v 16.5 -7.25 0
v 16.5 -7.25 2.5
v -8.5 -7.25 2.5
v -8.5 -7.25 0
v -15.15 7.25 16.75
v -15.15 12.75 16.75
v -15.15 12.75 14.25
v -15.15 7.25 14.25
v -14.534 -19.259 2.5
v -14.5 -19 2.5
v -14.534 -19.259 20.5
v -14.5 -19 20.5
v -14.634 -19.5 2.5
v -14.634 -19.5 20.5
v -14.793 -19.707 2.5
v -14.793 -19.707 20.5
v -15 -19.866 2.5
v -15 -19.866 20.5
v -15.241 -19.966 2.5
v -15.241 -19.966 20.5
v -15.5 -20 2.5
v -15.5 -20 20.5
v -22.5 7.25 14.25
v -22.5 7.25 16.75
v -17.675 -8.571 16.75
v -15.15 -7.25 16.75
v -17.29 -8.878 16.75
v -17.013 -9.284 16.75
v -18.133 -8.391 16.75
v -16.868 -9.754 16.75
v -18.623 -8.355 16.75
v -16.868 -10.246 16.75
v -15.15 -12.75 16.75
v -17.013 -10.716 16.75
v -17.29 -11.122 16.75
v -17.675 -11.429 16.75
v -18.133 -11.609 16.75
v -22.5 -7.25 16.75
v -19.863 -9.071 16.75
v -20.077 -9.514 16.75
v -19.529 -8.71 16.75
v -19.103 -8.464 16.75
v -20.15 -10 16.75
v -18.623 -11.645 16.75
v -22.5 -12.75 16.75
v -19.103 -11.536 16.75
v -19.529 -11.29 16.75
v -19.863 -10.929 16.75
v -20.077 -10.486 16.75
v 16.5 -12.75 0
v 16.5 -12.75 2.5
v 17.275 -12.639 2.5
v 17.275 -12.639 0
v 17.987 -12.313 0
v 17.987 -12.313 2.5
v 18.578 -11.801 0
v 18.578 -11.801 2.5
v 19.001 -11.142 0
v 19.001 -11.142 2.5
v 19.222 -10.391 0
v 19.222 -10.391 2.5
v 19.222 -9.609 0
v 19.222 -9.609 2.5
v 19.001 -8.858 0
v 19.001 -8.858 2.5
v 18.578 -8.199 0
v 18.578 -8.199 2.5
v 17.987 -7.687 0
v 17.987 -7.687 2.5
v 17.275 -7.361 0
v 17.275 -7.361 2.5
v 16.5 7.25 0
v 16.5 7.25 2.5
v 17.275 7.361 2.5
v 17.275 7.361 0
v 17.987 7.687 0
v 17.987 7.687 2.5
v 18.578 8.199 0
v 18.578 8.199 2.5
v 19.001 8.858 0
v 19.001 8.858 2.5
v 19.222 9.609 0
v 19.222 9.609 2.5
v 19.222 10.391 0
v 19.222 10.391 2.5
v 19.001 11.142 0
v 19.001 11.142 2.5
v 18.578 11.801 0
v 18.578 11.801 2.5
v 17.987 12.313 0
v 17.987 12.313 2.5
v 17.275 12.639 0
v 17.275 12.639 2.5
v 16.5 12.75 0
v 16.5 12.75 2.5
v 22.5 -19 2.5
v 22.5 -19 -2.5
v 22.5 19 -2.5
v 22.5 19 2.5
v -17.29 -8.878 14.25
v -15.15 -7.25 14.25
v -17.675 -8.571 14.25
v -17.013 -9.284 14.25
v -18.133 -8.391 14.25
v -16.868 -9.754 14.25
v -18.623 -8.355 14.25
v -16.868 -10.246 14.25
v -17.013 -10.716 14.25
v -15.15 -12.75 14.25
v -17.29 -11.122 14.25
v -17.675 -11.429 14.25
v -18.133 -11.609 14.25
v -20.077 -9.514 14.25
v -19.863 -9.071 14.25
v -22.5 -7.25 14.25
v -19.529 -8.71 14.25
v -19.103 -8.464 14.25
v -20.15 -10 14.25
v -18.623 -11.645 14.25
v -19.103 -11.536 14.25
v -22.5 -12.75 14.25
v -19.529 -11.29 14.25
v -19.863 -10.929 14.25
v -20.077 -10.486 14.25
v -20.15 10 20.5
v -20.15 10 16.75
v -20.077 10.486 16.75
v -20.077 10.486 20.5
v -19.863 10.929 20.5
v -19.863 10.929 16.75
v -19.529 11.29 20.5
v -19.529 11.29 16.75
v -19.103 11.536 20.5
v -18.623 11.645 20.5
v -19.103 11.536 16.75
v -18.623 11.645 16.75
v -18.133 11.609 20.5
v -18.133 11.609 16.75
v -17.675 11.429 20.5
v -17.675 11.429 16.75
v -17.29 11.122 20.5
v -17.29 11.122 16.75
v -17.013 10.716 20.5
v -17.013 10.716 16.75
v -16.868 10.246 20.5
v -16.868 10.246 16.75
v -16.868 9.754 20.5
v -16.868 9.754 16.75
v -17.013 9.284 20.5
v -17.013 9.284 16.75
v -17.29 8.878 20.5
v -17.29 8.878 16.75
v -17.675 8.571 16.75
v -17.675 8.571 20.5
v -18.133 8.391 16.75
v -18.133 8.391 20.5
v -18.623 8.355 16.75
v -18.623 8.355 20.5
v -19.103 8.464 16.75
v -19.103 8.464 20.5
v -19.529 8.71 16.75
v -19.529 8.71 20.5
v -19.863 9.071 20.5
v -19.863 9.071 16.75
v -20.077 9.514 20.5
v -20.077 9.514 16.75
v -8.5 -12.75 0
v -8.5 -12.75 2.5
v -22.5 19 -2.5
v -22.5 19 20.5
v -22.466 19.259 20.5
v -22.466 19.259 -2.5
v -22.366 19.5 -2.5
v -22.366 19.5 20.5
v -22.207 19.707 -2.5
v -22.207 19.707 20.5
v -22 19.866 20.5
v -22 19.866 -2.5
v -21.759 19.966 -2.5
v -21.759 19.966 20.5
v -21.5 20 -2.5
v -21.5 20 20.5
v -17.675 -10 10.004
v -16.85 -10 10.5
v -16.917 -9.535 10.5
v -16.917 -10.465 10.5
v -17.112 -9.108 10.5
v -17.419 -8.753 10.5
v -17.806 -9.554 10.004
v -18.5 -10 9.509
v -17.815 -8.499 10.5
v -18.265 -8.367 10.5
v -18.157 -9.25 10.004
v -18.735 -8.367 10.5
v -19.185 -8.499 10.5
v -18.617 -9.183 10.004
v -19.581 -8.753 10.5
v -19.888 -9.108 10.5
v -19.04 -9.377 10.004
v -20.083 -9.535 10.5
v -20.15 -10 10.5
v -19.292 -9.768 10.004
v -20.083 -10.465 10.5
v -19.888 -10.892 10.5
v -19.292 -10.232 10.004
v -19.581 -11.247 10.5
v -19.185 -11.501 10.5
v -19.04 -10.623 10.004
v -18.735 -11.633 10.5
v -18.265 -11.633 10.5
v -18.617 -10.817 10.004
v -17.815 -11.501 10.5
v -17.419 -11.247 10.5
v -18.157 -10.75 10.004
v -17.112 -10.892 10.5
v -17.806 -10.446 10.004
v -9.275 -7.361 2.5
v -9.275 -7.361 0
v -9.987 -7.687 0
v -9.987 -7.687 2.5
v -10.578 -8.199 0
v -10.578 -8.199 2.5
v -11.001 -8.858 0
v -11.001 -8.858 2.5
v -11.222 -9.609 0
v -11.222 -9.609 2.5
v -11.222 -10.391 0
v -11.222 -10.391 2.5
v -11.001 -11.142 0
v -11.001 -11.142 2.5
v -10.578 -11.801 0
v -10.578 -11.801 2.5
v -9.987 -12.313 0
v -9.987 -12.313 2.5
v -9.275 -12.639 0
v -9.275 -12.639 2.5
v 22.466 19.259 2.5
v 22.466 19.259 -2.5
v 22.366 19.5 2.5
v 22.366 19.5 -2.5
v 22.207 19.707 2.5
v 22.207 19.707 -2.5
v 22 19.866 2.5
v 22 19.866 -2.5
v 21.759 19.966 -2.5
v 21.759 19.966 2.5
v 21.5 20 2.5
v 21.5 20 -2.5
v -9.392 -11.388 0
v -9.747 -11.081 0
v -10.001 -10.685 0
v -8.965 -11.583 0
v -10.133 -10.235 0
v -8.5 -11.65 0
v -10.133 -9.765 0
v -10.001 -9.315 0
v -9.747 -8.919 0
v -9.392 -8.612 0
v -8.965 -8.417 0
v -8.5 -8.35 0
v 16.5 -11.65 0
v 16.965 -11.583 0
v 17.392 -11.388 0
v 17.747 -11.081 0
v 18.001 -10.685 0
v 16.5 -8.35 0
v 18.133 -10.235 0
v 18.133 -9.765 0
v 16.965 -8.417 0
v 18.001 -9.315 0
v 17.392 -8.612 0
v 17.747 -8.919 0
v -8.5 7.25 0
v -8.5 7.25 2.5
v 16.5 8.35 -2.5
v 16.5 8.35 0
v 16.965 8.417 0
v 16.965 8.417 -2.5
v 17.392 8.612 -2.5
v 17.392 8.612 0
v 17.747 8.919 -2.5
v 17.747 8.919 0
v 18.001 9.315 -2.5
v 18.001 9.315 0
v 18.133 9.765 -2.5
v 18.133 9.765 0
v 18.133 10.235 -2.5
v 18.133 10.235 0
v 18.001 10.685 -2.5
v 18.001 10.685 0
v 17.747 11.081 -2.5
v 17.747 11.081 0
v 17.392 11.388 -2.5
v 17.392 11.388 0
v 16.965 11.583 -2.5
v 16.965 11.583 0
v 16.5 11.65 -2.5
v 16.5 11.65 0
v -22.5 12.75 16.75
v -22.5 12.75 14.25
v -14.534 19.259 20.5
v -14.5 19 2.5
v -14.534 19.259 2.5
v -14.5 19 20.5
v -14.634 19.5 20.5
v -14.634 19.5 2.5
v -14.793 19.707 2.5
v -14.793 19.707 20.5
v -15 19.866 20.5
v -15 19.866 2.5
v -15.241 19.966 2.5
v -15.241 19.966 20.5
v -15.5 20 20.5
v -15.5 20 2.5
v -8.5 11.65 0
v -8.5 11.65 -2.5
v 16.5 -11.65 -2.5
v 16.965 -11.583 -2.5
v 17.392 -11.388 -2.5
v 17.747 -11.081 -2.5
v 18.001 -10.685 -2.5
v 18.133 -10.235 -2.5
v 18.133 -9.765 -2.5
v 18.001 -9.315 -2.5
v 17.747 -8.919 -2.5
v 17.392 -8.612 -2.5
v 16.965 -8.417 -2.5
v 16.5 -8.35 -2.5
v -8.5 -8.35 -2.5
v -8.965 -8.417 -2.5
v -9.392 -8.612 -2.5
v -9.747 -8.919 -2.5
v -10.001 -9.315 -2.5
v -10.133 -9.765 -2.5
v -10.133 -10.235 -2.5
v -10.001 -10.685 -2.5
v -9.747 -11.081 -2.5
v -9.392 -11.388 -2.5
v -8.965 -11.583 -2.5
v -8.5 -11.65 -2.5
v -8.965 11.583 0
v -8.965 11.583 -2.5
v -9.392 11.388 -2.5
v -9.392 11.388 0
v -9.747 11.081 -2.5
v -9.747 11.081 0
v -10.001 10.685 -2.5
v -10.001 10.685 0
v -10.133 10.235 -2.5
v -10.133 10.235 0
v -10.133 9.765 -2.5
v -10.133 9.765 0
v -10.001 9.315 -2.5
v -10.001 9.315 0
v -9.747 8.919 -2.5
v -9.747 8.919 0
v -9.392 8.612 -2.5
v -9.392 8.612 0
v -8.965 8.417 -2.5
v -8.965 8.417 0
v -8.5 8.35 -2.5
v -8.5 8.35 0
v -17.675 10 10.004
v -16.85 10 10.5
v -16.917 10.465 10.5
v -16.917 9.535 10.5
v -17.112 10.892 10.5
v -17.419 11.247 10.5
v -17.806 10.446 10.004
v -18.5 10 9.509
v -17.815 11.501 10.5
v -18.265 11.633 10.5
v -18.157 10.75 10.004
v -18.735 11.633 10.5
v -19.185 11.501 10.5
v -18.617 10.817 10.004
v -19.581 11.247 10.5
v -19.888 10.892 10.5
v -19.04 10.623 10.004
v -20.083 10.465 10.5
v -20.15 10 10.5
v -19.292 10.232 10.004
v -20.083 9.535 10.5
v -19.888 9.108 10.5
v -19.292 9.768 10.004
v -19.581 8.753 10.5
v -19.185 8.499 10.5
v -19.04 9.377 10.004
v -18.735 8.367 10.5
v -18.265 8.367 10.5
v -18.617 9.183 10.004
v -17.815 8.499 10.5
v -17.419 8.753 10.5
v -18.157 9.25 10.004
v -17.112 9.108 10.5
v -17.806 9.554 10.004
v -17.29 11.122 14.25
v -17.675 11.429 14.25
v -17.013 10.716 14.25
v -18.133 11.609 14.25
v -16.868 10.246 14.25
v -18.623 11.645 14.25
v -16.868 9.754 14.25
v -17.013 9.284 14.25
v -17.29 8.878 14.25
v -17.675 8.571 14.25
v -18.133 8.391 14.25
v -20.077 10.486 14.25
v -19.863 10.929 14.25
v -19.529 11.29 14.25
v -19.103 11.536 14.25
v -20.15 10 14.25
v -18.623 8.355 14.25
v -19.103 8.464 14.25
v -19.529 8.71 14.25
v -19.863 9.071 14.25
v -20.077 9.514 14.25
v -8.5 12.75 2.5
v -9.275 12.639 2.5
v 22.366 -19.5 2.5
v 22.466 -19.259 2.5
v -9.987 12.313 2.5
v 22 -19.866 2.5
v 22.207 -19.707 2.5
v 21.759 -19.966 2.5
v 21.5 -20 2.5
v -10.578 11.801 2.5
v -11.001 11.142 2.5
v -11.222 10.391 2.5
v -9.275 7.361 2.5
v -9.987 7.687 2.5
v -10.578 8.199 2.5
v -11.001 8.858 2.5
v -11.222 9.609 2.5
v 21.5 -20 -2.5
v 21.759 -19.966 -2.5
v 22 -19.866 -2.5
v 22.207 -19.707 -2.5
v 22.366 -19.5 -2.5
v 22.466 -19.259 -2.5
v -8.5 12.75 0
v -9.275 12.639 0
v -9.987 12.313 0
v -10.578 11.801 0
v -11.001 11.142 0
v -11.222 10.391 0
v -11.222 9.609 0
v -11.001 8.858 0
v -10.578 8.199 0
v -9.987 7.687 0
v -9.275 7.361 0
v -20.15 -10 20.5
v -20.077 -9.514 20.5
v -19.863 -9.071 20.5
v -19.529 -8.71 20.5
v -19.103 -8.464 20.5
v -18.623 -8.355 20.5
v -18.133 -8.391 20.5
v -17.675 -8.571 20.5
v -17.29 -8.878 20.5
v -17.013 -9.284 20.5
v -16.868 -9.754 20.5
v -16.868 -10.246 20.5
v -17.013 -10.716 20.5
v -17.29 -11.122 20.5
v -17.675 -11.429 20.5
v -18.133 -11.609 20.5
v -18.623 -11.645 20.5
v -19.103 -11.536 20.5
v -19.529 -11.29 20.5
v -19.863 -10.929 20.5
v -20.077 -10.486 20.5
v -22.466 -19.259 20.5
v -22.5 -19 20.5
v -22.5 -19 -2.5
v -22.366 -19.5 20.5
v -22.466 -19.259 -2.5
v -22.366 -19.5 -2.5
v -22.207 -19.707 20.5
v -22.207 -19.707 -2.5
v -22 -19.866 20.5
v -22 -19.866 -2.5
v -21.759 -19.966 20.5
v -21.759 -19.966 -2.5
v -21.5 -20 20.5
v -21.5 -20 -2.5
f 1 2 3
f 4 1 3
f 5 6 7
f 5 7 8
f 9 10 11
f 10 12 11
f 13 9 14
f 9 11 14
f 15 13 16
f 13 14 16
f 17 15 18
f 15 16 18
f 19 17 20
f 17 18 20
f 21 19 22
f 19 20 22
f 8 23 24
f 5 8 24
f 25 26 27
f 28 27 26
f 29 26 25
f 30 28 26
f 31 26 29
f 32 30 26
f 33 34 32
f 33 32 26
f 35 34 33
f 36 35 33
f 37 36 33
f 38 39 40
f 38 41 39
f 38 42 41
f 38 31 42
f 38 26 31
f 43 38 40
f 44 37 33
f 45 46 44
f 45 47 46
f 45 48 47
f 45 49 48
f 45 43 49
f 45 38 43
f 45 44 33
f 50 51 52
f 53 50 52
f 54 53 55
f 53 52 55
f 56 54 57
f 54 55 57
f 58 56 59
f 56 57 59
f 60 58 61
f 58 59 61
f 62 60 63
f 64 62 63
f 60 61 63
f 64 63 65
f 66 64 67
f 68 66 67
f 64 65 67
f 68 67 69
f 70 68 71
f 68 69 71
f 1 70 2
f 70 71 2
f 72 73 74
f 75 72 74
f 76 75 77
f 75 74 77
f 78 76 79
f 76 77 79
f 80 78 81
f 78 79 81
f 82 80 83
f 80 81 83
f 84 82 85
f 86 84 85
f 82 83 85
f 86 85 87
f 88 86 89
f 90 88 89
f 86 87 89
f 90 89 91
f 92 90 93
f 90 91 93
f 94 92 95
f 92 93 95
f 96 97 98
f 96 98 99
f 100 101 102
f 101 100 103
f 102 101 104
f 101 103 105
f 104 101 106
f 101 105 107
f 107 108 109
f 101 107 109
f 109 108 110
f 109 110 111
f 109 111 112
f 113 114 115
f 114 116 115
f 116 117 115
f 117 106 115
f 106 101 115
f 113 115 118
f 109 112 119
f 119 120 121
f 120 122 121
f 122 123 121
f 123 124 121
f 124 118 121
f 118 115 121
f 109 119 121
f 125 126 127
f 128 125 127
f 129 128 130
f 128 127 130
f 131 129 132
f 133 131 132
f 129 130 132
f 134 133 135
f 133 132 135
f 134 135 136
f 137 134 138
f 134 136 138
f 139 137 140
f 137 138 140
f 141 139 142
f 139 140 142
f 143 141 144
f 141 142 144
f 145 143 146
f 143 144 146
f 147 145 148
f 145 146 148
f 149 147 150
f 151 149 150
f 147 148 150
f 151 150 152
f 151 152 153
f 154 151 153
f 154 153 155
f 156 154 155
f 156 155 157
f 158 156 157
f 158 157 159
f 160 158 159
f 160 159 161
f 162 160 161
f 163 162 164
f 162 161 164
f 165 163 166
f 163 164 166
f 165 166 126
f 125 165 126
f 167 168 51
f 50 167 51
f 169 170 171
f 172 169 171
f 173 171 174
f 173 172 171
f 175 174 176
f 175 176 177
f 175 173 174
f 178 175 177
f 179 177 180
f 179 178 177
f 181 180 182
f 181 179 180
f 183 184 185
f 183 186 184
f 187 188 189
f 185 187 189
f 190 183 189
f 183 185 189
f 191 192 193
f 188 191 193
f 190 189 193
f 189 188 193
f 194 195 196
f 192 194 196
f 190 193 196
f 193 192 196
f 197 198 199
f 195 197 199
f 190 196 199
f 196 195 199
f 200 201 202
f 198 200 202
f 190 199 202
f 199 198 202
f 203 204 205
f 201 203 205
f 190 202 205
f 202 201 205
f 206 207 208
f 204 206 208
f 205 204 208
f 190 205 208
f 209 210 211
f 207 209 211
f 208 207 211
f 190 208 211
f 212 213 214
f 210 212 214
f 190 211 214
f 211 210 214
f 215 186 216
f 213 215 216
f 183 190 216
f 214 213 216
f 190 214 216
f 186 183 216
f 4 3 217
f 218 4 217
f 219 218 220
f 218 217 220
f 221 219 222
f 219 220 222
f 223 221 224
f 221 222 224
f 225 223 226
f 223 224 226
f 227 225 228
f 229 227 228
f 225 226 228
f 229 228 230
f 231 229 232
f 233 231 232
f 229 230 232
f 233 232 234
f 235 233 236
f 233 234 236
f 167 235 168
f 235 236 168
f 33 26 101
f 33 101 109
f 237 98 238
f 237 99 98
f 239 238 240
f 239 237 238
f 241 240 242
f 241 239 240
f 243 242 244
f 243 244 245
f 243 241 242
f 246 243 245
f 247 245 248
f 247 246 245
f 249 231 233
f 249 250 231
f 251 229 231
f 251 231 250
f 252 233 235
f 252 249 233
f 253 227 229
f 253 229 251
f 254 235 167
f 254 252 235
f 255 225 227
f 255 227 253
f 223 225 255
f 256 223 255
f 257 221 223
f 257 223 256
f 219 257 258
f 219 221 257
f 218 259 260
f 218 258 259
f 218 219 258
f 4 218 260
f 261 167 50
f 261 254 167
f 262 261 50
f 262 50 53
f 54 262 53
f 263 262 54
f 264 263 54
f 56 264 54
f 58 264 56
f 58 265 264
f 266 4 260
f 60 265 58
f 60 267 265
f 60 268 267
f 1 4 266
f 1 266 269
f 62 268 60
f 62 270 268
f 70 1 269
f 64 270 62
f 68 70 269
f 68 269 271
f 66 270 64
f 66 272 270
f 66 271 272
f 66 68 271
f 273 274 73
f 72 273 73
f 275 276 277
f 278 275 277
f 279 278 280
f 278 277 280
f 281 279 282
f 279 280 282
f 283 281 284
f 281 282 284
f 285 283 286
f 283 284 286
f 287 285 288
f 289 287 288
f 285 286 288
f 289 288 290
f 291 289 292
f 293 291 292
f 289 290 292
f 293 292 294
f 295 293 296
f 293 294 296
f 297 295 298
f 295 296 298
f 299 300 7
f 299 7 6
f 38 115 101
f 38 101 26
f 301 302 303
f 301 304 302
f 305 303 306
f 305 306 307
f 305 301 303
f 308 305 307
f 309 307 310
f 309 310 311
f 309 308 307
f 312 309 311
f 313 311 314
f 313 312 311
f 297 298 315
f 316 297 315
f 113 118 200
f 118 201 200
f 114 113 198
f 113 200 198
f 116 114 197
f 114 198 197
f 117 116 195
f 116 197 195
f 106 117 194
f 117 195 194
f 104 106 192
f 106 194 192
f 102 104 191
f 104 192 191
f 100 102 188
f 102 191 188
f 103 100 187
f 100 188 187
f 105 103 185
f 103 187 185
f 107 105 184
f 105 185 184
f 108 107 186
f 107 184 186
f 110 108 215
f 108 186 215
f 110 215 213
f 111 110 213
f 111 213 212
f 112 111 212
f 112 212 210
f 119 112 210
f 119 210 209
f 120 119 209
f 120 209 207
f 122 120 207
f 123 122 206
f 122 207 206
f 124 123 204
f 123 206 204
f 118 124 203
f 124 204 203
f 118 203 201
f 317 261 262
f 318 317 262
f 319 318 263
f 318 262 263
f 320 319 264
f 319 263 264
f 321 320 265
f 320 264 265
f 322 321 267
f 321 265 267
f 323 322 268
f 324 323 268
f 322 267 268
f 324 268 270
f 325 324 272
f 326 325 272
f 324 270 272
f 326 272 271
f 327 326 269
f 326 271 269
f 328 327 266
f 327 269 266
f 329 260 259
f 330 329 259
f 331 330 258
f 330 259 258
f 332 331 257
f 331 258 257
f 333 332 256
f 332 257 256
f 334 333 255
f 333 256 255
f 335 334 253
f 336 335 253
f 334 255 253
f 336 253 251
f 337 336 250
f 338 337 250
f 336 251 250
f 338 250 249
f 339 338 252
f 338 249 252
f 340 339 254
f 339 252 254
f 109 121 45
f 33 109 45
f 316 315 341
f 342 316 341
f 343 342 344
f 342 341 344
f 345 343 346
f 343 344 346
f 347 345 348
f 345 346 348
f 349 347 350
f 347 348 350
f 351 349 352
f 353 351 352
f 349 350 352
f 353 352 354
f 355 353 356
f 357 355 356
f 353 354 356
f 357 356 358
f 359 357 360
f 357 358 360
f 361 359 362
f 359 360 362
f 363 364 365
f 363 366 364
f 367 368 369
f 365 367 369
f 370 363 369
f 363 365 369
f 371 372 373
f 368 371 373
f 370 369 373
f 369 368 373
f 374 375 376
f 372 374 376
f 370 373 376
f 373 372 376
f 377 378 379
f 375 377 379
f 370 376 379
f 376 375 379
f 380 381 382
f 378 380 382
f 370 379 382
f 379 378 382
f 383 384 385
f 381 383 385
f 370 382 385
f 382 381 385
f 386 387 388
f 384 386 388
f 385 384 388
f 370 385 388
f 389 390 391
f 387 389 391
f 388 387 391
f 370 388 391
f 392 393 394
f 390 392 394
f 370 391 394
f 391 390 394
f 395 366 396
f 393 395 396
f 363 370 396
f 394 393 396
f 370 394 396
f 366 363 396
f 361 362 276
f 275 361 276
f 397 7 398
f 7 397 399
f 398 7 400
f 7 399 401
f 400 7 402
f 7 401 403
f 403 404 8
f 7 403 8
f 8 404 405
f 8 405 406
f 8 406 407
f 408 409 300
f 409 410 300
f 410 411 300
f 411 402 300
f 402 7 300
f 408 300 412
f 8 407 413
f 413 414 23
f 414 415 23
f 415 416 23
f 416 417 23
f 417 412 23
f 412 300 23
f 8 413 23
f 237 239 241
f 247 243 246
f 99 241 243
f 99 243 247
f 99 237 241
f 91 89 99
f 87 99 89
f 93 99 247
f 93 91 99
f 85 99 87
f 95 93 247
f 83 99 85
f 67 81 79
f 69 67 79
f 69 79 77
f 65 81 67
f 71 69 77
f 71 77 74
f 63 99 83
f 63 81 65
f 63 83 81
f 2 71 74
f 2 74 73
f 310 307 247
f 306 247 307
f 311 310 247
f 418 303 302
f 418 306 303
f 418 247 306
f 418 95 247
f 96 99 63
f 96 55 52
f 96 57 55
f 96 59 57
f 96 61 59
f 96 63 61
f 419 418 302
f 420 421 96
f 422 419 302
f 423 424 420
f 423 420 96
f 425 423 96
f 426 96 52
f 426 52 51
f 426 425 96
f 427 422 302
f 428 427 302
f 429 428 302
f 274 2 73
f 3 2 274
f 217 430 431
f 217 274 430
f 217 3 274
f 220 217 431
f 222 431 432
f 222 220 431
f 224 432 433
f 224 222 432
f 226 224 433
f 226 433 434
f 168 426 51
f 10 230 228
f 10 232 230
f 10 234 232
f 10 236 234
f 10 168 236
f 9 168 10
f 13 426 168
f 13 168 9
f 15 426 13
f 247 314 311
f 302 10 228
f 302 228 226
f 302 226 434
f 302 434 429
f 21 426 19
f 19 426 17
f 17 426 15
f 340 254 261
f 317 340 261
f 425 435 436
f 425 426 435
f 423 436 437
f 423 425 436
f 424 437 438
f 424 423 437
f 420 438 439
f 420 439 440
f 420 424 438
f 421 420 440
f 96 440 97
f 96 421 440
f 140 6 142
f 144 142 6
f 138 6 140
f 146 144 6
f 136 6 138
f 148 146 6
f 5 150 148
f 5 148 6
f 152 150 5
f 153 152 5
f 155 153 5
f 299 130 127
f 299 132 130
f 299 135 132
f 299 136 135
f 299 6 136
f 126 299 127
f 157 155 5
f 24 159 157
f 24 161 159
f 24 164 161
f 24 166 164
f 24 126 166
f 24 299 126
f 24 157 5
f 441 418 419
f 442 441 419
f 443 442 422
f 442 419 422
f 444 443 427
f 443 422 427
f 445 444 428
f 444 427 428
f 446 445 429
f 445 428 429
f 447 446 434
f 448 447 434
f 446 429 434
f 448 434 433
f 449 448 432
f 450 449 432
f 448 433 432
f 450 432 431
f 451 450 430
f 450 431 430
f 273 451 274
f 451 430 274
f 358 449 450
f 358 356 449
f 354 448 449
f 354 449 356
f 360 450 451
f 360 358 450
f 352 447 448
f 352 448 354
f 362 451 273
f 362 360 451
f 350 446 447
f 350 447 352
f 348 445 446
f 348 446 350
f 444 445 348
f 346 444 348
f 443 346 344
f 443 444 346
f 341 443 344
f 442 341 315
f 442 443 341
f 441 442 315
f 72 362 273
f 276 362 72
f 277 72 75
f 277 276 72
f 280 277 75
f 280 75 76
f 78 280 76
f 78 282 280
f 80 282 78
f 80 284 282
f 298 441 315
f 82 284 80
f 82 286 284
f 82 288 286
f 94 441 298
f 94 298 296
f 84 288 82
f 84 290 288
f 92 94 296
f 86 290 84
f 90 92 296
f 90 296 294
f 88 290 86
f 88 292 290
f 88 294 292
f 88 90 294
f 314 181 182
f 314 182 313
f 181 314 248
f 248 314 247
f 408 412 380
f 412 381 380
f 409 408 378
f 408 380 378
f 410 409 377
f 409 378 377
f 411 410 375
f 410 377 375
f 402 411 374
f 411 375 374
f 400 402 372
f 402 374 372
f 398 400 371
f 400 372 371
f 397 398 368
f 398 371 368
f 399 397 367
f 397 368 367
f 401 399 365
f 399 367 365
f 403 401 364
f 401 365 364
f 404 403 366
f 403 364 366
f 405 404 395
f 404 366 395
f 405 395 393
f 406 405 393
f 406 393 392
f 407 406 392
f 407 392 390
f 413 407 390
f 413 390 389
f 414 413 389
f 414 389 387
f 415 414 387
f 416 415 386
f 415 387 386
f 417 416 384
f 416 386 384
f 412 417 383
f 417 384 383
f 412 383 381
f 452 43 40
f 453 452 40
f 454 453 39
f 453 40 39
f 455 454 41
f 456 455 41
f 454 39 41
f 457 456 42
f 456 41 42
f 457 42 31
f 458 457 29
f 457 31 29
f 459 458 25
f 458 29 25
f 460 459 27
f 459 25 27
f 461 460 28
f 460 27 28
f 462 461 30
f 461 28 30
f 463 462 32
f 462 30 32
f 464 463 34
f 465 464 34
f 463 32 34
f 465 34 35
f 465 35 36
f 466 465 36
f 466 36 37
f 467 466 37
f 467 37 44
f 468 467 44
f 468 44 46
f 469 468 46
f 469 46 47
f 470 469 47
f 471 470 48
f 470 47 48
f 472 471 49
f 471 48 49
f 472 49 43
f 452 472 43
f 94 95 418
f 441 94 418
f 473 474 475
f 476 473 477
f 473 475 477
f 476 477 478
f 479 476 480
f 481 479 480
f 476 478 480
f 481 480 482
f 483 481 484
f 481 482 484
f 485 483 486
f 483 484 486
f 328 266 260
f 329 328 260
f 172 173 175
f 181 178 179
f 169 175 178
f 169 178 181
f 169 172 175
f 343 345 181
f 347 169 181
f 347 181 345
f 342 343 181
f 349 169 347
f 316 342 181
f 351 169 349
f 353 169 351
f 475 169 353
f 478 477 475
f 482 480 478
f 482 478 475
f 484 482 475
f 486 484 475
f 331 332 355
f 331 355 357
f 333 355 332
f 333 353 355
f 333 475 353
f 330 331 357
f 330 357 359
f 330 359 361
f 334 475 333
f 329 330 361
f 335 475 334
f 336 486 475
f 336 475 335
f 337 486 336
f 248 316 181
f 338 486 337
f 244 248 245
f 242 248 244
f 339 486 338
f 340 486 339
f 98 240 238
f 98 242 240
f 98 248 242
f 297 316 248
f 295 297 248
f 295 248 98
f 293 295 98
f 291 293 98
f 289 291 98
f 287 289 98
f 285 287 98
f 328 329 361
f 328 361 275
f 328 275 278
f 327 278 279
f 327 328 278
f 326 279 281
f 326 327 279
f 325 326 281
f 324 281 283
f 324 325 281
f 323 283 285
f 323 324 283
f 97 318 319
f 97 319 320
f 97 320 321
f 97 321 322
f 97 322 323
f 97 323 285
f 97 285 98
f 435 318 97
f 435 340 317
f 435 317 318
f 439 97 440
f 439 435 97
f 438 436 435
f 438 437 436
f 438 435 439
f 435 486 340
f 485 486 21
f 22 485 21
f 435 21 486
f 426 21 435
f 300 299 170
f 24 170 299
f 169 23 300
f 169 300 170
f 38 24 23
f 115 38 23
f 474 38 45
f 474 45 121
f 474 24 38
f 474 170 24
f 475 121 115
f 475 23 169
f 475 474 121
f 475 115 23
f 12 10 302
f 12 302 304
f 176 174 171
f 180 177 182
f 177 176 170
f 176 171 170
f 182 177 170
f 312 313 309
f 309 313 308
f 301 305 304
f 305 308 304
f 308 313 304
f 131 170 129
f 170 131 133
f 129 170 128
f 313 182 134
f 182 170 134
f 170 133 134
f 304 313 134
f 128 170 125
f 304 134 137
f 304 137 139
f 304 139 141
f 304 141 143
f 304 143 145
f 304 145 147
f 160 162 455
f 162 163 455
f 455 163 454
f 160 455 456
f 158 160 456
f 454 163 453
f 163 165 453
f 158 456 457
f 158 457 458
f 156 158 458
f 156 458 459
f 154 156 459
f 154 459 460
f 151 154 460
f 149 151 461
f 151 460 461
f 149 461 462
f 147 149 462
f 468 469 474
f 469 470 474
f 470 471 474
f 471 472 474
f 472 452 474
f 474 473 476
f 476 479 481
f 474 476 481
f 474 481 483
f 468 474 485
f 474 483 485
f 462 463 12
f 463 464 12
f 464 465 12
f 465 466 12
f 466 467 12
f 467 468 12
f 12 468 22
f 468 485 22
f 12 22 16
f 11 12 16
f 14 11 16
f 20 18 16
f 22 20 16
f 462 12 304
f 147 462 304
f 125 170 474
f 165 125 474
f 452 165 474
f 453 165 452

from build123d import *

# Parameters (mm, degrees)
F0_W      = 8
F0_H      = 18
F1_DEPTH  = 20
F2_R      = 1
F4_DEPTH  = 5
F6_DEPTH  = 2.5
F8_D      = 3.3
F8_DEPTH  = 10
F8_TIP    = 0.9914200214
F9_W      = 5.5
F9_H      = 2.5
F10_DEPTH = 7.35


with BuildPart() as f1:
    # F0 (on Front) → F1 (new body, symmetric)
    with BuildSketch(Plane.XZ):
        Polygon((-22.5, -2.5), (22.5, -2.5), (22.5, 2.5), (-14.5, 2.5), (-22.5, 2.5), align=None)
        with Locations((-18.5, 11.5)):
            Rectangle(F0_W, F0_H)
    extrude(amount=F1_DEPTH, both=True)

    # F2
    f2_edges = [f1.edges().sort_by_distance(p)[0] for p in [
        (-22.5, -20, 9),
        (-14.5, -20, 11.5),
        (22.5, -20, 0),
        (22.5, 20, 0),
        (-22.5, 20, 9),
        (-14.5, 20, 11.5),
    ]]
    fillet(f2_edges, radius=F2_R)

    # F3 (on face) → F4 (cut)
    with BuildSketch(Plane.XY.offset(2.5)):
        with BuildLine():
            ThreePointArc((-8.5, 11.65), (-10.15, 10), (-8.5, 8.35))
            Line((-8.5, 8.35), (16.5, 8.35))
            ThreePointArc((16.5, 8.35), (18.15, 10), (16.5, 11.65))
            Line((16.5, 11.65), (-8.5, 11.65))
        make_face()
        with BuildLine():
            ThreePointArc((-8.5, -8.35), (-10.15, -10), (-8.5, -11.65))
            Line((-8.5, -11.65), (16.5, -11.65))
            ThreePointArc((16.5, -11.65), (18.15, -10), (16.5, -8.35))
            Line((16.5, -8.35), (-8.5, -8.35))
        make_face()
    extrude(amount=-F4_DEPTH, mode=Mode.SUBTRACT)

    # F5 (on face) → F6 (cut)
    with BuildSketch(Plane.XY.offset(2.5)):
        with BuildLine():
            ThreePointArc((-8.5, 12.75), (-11.25, 10), (-8.5, 7.25))
            Line((-8.5, 7.25), (16.5, 7.25))
            ThreePointArc((16.5, 7.25), (19.25, 10), (16.5, 12.75))
            Line((16.5, 12.75), (-8.5, 12.75))
        make_face()
        with BuildLine():
            ThreePointArc((-8.5, -7.25), (-11.25, -10), (-8.5, -12.75))
            Line((-8.5, -12.75), (16.5, -12.75))
            ThreePointArc((16.5, -12.75), (19.25, -10), (16.5, -7.25))
            Line((16.5, -7.25), (-8.5, -7.25))
        make_face()
    extrude(amount=-F6_DEPTH, mode=Mode.SUBTRACT)

    # F8
    with Locations(Plane.XY.offset(20.5)):
        with Locations((-18.5, 10), (-18.5, -10)):
            Hole(F8_D / 2, depth=F8_DEPTH)
            with Locations((0, 0, -(F8_DEPTH + F8_TIP / 2))):  # 118° drill point
                Cone(0, F8_D / 2, F8_TIP, mode=Mode.SUBTRACT)

    # F9 (on face) → F10 (cut)
    with BuildSketch(Plane(origin=(-22.5, 0, 0), x_dir=(0, -1, 0), z_dir=(-1, 0, 0))):
        with Locations((-10, 15.5)):
            Rectangle(F9_W, F9_H)
        with Locations((10, 15.5)):
            Rectangle(F9_W, F9_H)
    extrude(amount=-F10_DEPTH, mode=Mode.SUBTRACT)


solid = f1.part
